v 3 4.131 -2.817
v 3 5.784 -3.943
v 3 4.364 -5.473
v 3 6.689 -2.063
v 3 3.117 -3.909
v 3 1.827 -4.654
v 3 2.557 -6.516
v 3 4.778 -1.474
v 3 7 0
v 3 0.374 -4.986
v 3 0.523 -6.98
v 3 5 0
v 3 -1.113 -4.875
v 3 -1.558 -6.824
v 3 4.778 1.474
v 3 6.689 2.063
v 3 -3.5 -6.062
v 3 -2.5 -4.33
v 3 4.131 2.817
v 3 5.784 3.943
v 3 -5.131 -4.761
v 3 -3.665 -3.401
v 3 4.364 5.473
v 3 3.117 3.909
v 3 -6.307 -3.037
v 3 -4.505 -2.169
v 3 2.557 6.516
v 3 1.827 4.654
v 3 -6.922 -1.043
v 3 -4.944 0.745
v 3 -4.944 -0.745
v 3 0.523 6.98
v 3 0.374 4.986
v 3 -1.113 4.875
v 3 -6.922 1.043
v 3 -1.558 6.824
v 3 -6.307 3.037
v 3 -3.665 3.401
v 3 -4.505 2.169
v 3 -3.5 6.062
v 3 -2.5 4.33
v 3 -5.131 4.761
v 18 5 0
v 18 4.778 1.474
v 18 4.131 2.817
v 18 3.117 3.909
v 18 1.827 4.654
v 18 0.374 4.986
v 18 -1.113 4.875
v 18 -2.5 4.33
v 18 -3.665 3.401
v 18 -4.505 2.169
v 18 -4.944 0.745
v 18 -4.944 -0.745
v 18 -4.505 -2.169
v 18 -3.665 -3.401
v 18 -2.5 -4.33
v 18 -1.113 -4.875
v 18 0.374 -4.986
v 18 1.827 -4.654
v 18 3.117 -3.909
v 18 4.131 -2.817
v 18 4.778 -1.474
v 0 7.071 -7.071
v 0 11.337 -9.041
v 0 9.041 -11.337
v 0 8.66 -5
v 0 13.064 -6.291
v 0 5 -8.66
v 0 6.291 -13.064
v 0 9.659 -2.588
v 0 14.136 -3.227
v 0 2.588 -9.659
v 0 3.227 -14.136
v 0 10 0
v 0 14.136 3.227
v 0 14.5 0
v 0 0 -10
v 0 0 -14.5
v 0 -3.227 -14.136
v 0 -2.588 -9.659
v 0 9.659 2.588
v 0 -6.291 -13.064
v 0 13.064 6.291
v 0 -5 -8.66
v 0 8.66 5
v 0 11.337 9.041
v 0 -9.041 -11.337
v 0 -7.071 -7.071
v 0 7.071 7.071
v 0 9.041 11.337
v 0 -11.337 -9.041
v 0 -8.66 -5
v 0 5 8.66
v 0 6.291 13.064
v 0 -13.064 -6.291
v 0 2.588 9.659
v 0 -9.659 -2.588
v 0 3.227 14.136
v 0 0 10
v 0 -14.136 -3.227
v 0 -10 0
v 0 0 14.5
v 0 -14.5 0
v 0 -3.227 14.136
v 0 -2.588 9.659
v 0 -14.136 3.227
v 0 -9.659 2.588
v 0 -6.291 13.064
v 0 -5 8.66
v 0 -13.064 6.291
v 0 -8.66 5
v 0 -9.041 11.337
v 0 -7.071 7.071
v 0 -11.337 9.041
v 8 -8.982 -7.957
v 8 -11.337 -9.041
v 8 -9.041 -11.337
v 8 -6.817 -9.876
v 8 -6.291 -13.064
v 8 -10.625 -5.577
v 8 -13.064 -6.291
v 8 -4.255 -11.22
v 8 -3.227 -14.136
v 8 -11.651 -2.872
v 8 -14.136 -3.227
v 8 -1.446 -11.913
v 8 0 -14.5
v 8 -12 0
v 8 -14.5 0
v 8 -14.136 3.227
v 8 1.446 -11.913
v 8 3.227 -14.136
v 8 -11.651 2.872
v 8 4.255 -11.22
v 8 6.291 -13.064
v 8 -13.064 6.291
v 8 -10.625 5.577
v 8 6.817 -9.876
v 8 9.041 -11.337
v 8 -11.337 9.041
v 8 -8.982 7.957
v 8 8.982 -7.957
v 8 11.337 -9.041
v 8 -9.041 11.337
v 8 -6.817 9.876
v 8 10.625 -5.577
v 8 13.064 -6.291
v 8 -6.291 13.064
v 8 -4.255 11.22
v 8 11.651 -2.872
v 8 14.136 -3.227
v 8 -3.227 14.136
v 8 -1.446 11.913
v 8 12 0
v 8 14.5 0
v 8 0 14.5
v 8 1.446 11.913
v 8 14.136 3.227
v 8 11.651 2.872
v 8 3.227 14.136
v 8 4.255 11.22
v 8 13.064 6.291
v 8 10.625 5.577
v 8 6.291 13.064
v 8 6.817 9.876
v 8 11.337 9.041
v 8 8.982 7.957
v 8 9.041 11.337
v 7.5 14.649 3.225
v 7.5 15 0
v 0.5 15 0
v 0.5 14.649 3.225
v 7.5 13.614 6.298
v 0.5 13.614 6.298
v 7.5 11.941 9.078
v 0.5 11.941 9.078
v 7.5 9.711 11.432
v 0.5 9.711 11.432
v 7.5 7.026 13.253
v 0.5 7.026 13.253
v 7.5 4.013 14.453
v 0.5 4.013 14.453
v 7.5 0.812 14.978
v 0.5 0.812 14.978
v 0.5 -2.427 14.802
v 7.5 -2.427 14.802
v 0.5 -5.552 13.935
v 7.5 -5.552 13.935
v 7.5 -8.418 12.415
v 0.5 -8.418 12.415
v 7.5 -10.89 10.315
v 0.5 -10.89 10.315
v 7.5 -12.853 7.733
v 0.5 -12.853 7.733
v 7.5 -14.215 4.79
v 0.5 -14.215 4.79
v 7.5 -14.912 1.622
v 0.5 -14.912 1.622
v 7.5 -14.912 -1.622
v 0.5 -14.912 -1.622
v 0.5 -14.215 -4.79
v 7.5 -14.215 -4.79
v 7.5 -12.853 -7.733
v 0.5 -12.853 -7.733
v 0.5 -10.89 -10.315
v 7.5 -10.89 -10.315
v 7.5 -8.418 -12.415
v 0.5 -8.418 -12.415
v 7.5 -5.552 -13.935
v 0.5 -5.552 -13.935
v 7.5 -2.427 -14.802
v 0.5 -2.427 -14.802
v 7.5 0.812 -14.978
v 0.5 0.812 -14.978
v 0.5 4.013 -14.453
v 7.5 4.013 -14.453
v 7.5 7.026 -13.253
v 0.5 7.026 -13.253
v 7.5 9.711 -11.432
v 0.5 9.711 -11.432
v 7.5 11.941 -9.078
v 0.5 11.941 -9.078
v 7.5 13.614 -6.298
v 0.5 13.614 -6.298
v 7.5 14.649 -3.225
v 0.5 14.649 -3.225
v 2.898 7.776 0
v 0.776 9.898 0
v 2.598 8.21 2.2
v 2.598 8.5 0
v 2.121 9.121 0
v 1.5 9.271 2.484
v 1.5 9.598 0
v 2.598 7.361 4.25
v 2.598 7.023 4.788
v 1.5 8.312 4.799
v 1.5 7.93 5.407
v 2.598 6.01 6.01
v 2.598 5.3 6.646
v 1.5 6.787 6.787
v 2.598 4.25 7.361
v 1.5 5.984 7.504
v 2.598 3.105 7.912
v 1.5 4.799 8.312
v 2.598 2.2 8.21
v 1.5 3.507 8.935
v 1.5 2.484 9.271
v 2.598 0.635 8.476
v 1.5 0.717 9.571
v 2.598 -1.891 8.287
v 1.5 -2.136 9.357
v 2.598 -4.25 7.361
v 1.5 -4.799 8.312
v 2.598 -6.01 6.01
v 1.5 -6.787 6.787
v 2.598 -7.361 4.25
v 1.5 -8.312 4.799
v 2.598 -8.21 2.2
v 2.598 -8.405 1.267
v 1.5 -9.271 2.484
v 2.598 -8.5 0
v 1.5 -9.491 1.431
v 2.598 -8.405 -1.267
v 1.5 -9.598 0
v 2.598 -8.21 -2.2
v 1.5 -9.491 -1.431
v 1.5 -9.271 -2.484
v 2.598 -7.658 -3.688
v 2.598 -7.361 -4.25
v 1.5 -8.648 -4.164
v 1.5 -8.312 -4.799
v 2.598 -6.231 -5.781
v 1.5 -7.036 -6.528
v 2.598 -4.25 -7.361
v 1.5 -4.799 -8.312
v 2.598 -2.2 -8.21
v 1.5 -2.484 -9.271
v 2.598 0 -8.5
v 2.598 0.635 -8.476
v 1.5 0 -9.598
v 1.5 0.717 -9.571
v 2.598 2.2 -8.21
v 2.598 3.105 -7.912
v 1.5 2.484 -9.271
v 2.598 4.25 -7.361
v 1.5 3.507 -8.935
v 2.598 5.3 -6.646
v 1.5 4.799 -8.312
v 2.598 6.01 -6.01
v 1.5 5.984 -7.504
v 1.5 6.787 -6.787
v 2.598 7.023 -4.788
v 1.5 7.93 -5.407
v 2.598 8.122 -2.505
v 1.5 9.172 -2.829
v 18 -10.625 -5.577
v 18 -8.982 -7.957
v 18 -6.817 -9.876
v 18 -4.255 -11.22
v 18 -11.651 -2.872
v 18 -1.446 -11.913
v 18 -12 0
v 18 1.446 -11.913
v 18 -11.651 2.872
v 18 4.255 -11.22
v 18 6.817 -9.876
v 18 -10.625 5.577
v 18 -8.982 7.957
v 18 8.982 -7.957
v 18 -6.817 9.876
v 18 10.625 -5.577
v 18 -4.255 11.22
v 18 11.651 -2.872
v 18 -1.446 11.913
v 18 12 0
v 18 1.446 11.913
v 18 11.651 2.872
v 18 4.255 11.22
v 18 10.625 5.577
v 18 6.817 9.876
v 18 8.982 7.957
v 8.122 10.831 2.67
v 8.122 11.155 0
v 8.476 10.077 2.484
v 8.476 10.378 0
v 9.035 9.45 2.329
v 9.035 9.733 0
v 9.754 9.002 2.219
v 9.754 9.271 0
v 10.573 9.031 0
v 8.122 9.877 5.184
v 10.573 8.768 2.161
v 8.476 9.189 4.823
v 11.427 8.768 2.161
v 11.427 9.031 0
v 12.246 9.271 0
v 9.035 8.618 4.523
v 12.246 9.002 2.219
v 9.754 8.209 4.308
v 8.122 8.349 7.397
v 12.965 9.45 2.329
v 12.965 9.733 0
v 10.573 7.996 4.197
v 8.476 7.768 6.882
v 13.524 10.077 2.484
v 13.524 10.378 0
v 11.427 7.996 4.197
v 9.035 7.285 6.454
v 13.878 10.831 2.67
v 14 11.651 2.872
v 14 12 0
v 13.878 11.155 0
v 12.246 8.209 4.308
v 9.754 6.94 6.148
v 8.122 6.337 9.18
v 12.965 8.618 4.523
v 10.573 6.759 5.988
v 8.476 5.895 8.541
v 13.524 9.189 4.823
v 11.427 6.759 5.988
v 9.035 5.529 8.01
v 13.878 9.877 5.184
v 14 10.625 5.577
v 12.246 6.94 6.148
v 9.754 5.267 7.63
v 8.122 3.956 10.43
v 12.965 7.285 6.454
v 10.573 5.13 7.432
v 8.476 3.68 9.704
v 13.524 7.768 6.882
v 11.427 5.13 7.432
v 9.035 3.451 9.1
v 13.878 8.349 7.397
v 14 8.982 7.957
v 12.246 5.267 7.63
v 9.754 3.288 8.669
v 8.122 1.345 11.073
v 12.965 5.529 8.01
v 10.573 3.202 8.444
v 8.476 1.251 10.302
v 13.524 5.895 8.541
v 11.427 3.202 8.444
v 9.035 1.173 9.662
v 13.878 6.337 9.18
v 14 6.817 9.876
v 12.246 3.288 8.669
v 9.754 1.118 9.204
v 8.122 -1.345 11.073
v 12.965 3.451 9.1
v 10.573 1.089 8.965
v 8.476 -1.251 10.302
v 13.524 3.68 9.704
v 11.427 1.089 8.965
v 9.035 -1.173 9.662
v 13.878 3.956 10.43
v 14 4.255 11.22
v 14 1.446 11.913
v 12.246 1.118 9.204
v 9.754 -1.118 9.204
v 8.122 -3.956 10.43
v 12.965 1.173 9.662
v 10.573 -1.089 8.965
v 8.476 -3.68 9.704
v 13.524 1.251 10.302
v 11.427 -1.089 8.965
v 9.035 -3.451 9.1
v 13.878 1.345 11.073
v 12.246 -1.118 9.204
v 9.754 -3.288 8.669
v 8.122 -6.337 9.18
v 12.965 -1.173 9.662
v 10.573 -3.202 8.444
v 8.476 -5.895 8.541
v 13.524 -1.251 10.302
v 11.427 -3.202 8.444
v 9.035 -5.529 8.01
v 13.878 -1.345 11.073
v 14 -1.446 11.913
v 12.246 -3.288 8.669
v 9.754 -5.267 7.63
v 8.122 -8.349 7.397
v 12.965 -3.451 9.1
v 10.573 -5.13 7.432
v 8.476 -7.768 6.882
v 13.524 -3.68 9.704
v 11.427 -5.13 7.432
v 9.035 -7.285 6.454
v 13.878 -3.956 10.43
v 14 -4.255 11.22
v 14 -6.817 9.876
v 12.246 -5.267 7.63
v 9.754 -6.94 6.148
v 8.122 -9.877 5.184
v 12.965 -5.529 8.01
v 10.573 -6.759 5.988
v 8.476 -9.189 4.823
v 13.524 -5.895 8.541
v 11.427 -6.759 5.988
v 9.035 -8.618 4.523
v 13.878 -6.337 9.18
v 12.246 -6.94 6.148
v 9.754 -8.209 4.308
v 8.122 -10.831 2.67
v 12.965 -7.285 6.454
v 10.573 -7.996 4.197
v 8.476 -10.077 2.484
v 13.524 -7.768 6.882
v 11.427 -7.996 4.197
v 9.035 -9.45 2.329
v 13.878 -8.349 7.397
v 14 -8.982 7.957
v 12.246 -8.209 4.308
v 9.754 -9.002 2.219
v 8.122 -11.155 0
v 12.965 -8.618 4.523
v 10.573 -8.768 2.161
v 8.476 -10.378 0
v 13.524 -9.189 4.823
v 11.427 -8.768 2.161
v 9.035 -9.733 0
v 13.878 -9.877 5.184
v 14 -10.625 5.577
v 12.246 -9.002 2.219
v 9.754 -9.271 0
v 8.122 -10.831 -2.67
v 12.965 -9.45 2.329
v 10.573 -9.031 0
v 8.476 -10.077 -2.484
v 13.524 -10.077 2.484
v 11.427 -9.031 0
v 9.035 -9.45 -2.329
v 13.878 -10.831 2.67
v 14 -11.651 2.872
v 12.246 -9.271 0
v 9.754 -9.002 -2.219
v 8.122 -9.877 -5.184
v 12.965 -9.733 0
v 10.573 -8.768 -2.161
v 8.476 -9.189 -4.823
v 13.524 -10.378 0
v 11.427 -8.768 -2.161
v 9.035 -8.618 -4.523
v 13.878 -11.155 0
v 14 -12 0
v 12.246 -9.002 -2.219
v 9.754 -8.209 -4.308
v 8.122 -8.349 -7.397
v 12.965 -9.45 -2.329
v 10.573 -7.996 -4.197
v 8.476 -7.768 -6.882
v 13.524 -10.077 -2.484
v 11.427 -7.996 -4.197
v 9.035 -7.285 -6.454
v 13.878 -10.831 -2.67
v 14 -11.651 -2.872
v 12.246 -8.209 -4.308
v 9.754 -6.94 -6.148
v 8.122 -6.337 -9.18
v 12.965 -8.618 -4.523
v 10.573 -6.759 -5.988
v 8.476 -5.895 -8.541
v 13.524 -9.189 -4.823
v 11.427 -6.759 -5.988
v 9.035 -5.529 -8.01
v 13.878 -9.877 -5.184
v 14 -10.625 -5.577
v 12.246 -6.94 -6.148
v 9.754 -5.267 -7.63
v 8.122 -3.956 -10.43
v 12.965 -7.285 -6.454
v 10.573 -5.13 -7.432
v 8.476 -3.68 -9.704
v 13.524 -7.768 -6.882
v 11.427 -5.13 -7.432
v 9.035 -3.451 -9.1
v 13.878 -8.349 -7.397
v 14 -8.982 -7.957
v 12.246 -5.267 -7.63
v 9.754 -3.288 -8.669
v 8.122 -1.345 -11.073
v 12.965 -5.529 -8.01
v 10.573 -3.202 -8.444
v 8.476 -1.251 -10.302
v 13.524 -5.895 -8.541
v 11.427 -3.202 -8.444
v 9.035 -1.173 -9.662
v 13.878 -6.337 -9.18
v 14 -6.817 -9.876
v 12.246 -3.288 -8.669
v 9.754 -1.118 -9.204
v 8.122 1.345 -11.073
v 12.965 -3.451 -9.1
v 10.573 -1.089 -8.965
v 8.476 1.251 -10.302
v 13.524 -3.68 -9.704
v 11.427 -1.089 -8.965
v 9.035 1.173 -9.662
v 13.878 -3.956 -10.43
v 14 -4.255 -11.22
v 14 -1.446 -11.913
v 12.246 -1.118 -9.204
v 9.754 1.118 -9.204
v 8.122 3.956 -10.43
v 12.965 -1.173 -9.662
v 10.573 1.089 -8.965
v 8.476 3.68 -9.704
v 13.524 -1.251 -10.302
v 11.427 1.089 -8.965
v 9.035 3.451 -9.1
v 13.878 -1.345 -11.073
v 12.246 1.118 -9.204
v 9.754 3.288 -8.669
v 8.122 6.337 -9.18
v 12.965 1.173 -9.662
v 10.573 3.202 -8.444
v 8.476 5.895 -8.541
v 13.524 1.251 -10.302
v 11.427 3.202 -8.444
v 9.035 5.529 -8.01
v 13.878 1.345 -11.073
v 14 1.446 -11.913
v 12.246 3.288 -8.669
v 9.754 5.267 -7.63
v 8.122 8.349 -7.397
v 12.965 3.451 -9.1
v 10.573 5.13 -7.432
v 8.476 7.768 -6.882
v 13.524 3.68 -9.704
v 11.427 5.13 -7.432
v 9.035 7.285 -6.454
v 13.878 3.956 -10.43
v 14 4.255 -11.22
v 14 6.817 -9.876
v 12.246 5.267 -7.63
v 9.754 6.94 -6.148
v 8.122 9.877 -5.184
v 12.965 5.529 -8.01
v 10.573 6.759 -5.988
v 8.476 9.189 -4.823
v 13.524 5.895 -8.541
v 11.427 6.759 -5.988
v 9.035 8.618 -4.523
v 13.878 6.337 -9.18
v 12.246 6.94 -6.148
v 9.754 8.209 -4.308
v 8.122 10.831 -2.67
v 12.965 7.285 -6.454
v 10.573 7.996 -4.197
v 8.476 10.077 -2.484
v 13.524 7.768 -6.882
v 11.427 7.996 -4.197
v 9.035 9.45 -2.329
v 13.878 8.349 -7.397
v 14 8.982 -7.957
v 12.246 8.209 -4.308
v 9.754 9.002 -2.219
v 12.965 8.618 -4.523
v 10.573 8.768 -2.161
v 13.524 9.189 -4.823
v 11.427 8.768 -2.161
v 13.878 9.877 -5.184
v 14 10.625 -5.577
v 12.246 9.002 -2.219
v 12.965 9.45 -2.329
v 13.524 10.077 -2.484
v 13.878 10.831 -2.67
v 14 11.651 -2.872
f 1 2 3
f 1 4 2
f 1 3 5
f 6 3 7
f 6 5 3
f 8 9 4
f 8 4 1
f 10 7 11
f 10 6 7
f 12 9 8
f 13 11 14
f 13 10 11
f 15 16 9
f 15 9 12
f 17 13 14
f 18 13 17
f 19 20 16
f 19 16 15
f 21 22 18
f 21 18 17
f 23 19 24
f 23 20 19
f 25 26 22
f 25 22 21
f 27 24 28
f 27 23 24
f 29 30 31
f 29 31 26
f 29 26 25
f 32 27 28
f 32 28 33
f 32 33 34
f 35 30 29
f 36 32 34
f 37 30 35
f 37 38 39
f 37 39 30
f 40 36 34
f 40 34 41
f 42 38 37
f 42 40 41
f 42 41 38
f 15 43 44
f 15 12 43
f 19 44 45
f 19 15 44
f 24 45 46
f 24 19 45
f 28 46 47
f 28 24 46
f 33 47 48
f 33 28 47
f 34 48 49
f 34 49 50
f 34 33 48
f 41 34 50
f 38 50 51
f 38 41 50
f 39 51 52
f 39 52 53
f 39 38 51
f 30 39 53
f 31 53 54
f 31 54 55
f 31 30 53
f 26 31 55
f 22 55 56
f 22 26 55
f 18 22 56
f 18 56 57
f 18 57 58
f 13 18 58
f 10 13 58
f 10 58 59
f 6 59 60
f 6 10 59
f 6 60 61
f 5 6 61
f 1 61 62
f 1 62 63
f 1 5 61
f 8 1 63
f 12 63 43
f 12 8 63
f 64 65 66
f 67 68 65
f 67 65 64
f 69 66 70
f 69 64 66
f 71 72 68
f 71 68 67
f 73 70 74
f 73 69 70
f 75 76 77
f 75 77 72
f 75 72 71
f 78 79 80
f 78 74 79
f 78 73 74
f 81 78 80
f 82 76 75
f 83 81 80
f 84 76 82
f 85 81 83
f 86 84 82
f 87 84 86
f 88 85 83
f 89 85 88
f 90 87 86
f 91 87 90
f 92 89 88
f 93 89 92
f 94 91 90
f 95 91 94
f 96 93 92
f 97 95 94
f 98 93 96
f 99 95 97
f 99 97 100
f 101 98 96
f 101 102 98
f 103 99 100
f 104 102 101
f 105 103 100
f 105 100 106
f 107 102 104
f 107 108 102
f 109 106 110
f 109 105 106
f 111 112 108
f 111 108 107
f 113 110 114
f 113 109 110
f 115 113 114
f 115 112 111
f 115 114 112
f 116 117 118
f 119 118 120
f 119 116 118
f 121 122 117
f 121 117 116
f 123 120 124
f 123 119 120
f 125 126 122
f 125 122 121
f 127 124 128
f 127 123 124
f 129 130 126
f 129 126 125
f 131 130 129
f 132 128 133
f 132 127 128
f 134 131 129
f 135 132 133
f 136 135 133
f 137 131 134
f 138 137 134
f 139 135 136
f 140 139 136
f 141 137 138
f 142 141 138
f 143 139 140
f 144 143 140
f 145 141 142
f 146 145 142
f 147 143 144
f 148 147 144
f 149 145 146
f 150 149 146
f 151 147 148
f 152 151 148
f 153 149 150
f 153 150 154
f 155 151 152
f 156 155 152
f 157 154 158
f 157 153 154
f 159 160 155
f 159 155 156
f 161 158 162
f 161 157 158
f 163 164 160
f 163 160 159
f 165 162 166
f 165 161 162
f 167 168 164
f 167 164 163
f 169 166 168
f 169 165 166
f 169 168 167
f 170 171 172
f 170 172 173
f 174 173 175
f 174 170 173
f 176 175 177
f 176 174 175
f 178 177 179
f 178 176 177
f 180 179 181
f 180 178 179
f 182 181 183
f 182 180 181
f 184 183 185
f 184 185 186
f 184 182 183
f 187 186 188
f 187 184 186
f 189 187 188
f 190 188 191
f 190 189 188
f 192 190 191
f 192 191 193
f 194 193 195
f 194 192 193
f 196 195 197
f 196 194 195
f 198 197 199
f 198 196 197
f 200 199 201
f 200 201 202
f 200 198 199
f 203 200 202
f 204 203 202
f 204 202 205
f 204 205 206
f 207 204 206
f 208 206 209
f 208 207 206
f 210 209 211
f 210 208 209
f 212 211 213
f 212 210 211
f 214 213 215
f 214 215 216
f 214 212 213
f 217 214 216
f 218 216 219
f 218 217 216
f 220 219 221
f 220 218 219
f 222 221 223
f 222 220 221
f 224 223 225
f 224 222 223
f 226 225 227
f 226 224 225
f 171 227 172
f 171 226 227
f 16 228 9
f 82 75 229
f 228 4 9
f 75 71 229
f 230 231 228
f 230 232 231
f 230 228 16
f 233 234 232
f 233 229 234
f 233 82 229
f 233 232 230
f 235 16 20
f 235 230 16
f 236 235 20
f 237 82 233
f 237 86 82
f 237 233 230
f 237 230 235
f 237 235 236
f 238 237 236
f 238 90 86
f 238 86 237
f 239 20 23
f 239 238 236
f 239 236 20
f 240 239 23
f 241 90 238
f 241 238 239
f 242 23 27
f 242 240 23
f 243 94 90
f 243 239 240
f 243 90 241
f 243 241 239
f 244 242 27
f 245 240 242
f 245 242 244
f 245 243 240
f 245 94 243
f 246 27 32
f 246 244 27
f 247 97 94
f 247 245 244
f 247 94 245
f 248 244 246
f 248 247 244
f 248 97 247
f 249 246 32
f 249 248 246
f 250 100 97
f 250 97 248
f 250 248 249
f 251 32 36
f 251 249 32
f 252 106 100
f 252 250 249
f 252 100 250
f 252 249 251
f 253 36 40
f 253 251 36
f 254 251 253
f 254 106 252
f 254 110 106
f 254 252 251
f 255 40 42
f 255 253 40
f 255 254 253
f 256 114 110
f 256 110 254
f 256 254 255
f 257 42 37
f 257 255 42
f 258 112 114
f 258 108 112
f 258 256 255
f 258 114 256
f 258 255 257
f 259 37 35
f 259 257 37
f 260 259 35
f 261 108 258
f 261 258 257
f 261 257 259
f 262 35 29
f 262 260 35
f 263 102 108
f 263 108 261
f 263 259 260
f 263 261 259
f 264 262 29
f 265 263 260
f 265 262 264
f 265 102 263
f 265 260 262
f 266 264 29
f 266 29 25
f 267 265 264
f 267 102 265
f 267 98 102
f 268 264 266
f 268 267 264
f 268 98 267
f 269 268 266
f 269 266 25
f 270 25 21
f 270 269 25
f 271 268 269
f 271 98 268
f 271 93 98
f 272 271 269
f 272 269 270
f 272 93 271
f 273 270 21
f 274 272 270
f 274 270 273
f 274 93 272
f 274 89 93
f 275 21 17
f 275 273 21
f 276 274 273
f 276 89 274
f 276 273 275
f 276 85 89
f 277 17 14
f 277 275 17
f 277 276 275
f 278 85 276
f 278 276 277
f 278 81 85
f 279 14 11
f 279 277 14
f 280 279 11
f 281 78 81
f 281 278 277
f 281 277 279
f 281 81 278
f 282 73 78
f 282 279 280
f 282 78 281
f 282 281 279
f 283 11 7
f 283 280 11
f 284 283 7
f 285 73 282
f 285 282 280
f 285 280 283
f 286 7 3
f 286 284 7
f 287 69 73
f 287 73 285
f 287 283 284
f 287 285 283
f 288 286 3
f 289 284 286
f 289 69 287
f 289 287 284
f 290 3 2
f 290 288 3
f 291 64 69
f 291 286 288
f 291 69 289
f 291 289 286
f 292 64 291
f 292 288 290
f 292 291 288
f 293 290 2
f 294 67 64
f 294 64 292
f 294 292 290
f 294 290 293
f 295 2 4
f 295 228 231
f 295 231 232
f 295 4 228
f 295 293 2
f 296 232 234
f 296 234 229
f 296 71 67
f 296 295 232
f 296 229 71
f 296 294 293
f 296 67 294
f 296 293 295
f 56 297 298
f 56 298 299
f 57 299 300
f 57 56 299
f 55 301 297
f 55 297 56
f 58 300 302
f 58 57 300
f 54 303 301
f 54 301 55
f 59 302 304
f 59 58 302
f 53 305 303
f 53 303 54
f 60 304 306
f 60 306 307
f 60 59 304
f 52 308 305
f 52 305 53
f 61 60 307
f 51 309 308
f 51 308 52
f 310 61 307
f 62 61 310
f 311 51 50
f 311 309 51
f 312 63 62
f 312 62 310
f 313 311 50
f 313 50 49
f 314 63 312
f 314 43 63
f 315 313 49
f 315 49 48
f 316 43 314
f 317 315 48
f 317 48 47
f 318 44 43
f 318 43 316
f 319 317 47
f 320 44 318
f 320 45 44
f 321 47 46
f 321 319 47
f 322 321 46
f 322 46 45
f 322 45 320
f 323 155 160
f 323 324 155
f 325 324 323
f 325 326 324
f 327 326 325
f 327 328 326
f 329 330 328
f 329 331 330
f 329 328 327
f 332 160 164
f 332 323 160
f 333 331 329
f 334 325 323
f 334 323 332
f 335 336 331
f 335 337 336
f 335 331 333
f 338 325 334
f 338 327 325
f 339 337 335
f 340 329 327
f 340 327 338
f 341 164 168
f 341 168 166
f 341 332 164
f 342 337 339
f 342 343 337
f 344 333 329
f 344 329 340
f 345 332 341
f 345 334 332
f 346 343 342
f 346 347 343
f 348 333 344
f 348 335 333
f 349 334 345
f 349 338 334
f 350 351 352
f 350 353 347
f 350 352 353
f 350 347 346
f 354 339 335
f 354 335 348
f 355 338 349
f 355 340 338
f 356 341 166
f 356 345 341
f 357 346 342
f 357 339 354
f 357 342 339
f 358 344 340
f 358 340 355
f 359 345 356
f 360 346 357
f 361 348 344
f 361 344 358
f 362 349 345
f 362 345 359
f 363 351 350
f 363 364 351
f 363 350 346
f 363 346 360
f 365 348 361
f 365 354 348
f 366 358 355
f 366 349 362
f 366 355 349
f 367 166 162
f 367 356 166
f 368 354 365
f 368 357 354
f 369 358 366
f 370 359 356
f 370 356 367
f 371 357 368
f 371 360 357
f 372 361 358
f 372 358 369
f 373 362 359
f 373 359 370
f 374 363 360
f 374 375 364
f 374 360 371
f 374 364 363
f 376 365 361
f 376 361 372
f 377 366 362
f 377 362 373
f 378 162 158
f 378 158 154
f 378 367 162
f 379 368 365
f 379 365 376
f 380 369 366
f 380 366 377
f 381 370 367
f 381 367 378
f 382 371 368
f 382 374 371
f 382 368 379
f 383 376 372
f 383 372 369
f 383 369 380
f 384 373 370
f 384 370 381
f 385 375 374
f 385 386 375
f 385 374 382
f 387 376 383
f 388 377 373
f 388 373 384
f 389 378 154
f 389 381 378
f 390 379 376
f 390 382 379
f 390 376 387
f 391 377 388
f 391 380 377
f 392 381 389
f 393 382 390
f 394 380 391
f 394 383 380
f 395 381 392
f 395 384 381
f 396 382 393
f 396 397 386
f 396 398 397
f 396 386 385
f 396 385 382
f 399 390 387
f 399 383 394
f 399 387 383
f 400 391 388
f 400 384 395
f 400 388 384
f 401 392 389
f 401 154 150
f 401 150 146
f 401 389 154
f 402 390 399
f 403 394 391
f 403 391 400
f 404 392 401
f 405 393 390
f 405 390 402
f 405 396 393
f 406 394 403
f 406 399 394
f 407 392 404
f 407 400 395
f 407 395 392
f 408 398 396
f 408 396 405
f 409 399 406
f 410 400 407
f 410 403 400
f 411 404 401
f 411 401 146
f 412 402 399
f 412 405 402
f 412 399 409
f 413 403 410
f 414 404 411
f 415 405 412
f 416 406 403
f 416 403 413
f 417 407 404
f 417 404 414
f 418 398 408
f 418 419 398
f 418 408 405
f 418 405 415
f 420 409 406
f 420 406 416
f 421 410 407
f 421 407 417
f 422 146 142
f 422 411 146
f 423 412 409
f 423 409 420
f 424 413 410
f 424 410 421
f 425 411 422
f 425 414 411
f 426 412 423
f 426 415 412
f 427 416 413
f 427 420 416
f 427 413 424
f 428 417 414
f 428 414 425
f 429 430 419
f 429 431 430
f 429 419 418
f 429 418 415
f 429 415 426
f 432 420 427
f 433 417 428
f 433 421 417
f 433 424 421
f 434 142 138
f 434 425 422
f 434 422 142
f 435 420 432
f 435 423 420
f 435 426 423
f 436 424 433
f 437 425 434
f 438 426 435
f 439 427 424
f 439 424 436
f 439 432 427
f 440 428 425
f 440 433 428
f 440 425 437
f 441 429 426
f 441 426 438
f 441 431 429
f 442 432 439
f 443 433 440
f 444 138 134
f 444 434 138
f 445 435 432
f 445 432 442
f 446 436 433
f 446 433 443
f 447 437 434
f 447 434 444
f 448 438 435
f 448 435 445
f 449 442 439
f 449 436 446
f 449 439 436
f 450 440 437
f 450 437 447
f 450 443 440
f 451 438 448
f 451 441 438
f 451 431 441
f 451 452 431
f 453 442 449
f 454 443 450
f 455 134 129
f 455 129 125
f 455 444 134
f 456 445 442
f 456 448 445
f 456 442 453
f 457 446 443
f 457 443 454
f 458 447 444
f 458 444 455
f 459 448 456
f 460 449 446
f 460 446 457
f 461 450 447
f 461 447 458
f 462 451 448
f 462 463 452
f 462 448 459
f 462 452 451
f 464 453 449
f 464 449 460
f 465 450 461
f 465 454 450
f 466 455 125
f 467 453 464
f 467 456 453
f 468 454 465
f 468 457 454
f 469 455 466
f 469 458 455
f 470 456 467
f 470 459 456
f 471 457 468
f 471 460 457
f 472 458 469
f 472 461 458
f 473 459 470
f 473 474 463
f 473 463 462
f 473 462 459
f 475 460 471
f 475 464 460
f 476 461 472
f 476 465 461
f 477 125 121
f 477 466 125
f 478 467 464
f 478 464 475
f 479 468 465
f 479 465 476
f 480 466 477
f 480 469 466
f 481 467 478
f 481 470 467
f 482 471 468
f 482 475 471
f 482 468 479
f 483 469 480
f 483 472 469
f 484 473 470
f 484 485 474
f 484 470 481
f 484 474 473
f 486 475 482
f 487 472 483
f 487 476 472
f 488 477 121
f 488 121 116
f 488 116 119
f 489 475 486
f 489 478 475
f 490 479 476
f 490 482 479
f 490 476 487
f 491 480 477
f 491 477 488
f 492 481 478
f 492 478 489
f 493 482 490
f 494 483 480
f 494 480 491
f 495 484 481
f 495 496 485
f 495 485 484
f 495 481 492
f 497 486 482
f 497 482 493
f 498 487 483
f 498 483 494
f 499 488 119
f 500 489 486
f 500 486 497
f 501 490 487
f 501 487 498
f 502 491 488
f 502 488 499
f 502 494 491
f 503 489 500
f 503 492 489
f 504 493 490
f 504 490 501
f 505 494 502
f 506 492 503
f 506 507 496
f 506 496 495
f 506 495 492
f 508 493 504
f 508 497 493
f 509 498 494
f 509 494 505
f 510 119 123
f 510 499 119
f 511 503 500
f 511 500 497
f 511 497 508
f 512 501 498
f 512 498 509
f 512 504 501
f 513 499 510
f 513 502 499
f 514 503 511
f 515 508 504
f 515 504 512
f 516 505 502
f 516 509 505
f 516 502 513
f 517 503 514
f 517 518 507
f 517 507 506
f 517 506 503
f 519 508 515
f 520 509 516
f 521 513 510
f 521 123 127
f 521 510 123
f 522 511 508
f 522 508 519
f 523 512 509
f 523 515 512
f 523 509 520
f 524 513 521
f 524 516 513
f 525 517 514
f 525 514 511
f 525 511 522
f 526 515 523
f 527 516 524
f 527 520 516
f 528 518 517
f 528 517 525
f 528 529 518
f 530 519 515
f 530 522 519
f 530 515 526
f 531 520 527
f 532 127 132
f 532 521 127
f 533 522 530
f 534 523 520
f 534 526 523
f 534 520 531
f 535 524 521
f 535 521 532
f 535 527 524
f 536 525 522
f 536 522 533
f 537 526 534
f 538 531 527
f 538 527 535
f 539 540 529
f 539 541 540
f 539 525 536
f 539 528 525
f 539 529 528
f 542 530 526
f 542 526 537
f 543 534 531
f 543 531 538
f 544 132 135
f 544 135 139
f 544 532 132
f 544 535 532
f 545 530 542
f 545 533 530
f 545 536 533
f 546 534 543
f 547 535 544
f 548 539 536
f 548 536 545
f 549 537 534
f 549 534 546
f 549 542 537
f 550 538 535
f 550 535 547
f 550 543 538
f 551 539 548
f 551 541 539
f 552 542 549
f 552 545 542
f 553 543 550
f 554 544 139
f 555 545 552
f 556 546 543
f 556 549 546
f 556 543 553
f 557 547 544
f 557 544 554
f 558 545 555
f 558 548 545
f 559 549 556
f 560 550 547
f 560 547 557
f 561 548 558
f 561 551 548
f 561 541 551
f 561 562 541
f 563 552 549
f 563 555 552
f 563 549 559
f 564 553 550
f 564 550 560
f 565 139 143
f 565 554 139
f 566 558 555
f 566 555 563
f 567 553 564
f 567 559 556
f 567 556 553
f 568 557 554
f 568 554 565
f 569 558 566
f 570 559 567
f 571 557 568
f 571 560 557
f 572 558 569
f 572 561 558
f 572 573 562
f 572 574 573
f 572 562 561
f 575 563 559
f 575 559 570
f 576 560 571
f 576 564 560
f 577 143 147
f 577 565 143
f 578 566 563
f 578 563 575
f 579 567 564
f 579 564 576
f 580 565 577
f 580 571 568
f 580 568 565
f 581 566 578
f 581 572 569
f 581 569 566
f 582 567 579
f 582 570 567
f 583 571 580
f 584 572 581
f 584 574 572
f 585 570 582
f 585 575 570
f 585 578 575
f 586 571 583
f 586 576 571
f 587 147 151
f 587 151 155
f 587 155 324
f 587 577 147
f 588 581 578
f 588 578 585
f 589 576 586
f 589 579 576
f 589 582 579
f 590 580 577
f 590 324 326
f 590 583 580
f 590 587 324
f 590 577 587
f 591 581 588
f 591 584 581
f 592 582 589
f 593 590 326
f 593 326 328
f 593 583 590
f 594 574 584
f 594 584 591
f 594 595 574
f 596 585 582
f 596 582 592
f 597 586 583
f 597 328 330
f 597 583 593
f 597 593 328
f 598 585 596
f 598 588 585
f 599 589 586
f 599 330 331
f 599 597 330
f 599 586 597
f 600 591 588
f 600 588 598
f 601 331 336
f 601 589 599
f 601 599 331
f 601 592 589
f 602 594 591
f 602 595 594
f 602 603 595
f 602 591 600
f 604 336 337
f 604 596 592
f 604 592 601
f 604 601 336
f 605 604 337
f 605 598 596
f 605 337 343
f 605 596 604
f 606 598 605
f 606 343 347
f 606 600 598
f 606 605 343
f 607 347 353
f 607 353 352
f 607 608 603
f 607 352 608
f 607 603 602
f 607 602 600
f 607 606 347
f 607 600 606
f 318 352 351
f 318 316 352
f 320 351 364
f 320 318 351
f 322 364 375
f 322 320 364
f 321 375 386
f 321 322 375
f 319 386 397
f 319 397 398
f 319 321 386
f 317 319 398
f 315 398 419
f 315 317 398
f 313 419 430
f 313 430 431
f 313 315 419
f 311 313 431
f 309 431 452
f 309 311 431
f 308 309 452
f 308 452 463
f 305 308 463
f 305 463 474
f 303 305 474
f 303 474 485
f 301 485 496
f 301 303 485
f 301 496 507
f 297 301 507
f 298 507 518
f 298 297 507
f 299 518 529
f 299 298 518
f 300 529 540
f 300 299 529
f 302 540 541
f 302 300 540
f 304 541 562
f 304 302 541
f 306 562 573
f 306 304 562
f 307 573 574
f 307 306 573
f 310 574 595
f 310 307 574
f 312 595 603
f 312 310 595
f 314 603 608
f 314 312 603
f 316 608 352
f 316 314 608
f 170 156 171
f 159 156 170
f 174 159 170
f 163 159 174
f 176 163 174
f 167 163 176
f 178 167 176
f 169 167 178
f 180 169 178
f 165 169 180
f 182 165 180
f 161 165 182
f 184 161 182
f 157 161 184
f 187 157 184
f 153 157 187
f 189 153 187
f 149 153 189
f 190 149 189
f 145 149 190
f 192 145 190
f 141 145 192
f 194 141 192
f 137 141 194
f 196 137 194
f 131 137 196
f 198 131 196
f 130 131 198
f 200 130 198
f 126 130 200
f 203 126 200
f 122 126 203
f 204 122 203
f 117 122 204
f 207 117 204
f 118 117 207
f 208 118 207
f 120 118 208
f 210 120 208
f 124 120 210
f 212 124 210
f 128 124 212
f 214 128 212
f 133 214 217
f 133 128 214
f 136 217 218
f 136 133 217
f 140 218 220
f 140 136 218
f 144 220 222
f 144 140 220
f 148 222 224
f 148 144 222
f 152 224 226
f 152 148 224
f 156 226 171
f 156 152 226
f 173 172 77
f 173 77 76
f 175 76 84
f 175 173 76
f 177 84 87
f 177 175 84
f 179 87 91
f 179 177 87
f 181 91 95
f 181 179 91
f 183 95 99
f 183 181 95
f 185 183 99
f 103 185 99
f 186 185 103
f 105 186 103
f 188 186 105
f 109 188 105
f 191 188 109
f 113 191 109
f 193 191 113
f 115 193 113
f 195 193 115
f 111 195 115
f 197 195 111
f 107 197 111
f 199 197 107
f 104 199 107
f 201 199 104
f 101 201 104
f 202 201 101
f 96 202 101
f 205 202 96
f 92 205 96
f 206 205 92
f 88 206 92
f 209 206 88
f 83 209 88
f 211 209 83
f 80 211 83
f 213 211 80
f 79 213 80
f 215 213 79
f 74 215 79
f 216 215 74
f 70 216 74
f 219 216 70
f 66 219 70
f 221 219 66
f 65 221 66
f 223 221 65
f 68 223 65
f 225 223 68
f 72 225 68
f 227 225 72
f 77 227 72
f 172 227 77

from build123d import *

# Parameters (mm, degrees)
CHAMFER1_SIZE = 0.5


with BuildPart() as part:
    # Sketch1 → Revolve1 (revolve)
    with BuildSketch(Plane.XY):
        with BuildLine():
            Line((18, 12), (18, 5))
            Line((18, 5), (3, 5))
            Line((3, 5), (3, 7))
            ThreePointArc((3, 7), (2.121320344, 9.121320344), (0, 10))
            Line((0, 10), (0, 15))
            Line((0, 15), (8, 15))
            Line((8, 15), (8, 12))
            ThreePointArc((8, 12), (11, 9), (14, 12))
            Line((14, 12), (18, 12))
        make_face()
    revolve(axis=Axis((0, 0, 0), (1, 0, 0)))

    # Chamfer1
    chamfer1_edges = [part.edges().sort_by_distance(p)[0] for p in [
        (0, -15, 0),
        (8, -15, 0),
    ]]
    chamfer(chamfer1_edges, length=CHAMFER1_SIZE)


solid = part.part
